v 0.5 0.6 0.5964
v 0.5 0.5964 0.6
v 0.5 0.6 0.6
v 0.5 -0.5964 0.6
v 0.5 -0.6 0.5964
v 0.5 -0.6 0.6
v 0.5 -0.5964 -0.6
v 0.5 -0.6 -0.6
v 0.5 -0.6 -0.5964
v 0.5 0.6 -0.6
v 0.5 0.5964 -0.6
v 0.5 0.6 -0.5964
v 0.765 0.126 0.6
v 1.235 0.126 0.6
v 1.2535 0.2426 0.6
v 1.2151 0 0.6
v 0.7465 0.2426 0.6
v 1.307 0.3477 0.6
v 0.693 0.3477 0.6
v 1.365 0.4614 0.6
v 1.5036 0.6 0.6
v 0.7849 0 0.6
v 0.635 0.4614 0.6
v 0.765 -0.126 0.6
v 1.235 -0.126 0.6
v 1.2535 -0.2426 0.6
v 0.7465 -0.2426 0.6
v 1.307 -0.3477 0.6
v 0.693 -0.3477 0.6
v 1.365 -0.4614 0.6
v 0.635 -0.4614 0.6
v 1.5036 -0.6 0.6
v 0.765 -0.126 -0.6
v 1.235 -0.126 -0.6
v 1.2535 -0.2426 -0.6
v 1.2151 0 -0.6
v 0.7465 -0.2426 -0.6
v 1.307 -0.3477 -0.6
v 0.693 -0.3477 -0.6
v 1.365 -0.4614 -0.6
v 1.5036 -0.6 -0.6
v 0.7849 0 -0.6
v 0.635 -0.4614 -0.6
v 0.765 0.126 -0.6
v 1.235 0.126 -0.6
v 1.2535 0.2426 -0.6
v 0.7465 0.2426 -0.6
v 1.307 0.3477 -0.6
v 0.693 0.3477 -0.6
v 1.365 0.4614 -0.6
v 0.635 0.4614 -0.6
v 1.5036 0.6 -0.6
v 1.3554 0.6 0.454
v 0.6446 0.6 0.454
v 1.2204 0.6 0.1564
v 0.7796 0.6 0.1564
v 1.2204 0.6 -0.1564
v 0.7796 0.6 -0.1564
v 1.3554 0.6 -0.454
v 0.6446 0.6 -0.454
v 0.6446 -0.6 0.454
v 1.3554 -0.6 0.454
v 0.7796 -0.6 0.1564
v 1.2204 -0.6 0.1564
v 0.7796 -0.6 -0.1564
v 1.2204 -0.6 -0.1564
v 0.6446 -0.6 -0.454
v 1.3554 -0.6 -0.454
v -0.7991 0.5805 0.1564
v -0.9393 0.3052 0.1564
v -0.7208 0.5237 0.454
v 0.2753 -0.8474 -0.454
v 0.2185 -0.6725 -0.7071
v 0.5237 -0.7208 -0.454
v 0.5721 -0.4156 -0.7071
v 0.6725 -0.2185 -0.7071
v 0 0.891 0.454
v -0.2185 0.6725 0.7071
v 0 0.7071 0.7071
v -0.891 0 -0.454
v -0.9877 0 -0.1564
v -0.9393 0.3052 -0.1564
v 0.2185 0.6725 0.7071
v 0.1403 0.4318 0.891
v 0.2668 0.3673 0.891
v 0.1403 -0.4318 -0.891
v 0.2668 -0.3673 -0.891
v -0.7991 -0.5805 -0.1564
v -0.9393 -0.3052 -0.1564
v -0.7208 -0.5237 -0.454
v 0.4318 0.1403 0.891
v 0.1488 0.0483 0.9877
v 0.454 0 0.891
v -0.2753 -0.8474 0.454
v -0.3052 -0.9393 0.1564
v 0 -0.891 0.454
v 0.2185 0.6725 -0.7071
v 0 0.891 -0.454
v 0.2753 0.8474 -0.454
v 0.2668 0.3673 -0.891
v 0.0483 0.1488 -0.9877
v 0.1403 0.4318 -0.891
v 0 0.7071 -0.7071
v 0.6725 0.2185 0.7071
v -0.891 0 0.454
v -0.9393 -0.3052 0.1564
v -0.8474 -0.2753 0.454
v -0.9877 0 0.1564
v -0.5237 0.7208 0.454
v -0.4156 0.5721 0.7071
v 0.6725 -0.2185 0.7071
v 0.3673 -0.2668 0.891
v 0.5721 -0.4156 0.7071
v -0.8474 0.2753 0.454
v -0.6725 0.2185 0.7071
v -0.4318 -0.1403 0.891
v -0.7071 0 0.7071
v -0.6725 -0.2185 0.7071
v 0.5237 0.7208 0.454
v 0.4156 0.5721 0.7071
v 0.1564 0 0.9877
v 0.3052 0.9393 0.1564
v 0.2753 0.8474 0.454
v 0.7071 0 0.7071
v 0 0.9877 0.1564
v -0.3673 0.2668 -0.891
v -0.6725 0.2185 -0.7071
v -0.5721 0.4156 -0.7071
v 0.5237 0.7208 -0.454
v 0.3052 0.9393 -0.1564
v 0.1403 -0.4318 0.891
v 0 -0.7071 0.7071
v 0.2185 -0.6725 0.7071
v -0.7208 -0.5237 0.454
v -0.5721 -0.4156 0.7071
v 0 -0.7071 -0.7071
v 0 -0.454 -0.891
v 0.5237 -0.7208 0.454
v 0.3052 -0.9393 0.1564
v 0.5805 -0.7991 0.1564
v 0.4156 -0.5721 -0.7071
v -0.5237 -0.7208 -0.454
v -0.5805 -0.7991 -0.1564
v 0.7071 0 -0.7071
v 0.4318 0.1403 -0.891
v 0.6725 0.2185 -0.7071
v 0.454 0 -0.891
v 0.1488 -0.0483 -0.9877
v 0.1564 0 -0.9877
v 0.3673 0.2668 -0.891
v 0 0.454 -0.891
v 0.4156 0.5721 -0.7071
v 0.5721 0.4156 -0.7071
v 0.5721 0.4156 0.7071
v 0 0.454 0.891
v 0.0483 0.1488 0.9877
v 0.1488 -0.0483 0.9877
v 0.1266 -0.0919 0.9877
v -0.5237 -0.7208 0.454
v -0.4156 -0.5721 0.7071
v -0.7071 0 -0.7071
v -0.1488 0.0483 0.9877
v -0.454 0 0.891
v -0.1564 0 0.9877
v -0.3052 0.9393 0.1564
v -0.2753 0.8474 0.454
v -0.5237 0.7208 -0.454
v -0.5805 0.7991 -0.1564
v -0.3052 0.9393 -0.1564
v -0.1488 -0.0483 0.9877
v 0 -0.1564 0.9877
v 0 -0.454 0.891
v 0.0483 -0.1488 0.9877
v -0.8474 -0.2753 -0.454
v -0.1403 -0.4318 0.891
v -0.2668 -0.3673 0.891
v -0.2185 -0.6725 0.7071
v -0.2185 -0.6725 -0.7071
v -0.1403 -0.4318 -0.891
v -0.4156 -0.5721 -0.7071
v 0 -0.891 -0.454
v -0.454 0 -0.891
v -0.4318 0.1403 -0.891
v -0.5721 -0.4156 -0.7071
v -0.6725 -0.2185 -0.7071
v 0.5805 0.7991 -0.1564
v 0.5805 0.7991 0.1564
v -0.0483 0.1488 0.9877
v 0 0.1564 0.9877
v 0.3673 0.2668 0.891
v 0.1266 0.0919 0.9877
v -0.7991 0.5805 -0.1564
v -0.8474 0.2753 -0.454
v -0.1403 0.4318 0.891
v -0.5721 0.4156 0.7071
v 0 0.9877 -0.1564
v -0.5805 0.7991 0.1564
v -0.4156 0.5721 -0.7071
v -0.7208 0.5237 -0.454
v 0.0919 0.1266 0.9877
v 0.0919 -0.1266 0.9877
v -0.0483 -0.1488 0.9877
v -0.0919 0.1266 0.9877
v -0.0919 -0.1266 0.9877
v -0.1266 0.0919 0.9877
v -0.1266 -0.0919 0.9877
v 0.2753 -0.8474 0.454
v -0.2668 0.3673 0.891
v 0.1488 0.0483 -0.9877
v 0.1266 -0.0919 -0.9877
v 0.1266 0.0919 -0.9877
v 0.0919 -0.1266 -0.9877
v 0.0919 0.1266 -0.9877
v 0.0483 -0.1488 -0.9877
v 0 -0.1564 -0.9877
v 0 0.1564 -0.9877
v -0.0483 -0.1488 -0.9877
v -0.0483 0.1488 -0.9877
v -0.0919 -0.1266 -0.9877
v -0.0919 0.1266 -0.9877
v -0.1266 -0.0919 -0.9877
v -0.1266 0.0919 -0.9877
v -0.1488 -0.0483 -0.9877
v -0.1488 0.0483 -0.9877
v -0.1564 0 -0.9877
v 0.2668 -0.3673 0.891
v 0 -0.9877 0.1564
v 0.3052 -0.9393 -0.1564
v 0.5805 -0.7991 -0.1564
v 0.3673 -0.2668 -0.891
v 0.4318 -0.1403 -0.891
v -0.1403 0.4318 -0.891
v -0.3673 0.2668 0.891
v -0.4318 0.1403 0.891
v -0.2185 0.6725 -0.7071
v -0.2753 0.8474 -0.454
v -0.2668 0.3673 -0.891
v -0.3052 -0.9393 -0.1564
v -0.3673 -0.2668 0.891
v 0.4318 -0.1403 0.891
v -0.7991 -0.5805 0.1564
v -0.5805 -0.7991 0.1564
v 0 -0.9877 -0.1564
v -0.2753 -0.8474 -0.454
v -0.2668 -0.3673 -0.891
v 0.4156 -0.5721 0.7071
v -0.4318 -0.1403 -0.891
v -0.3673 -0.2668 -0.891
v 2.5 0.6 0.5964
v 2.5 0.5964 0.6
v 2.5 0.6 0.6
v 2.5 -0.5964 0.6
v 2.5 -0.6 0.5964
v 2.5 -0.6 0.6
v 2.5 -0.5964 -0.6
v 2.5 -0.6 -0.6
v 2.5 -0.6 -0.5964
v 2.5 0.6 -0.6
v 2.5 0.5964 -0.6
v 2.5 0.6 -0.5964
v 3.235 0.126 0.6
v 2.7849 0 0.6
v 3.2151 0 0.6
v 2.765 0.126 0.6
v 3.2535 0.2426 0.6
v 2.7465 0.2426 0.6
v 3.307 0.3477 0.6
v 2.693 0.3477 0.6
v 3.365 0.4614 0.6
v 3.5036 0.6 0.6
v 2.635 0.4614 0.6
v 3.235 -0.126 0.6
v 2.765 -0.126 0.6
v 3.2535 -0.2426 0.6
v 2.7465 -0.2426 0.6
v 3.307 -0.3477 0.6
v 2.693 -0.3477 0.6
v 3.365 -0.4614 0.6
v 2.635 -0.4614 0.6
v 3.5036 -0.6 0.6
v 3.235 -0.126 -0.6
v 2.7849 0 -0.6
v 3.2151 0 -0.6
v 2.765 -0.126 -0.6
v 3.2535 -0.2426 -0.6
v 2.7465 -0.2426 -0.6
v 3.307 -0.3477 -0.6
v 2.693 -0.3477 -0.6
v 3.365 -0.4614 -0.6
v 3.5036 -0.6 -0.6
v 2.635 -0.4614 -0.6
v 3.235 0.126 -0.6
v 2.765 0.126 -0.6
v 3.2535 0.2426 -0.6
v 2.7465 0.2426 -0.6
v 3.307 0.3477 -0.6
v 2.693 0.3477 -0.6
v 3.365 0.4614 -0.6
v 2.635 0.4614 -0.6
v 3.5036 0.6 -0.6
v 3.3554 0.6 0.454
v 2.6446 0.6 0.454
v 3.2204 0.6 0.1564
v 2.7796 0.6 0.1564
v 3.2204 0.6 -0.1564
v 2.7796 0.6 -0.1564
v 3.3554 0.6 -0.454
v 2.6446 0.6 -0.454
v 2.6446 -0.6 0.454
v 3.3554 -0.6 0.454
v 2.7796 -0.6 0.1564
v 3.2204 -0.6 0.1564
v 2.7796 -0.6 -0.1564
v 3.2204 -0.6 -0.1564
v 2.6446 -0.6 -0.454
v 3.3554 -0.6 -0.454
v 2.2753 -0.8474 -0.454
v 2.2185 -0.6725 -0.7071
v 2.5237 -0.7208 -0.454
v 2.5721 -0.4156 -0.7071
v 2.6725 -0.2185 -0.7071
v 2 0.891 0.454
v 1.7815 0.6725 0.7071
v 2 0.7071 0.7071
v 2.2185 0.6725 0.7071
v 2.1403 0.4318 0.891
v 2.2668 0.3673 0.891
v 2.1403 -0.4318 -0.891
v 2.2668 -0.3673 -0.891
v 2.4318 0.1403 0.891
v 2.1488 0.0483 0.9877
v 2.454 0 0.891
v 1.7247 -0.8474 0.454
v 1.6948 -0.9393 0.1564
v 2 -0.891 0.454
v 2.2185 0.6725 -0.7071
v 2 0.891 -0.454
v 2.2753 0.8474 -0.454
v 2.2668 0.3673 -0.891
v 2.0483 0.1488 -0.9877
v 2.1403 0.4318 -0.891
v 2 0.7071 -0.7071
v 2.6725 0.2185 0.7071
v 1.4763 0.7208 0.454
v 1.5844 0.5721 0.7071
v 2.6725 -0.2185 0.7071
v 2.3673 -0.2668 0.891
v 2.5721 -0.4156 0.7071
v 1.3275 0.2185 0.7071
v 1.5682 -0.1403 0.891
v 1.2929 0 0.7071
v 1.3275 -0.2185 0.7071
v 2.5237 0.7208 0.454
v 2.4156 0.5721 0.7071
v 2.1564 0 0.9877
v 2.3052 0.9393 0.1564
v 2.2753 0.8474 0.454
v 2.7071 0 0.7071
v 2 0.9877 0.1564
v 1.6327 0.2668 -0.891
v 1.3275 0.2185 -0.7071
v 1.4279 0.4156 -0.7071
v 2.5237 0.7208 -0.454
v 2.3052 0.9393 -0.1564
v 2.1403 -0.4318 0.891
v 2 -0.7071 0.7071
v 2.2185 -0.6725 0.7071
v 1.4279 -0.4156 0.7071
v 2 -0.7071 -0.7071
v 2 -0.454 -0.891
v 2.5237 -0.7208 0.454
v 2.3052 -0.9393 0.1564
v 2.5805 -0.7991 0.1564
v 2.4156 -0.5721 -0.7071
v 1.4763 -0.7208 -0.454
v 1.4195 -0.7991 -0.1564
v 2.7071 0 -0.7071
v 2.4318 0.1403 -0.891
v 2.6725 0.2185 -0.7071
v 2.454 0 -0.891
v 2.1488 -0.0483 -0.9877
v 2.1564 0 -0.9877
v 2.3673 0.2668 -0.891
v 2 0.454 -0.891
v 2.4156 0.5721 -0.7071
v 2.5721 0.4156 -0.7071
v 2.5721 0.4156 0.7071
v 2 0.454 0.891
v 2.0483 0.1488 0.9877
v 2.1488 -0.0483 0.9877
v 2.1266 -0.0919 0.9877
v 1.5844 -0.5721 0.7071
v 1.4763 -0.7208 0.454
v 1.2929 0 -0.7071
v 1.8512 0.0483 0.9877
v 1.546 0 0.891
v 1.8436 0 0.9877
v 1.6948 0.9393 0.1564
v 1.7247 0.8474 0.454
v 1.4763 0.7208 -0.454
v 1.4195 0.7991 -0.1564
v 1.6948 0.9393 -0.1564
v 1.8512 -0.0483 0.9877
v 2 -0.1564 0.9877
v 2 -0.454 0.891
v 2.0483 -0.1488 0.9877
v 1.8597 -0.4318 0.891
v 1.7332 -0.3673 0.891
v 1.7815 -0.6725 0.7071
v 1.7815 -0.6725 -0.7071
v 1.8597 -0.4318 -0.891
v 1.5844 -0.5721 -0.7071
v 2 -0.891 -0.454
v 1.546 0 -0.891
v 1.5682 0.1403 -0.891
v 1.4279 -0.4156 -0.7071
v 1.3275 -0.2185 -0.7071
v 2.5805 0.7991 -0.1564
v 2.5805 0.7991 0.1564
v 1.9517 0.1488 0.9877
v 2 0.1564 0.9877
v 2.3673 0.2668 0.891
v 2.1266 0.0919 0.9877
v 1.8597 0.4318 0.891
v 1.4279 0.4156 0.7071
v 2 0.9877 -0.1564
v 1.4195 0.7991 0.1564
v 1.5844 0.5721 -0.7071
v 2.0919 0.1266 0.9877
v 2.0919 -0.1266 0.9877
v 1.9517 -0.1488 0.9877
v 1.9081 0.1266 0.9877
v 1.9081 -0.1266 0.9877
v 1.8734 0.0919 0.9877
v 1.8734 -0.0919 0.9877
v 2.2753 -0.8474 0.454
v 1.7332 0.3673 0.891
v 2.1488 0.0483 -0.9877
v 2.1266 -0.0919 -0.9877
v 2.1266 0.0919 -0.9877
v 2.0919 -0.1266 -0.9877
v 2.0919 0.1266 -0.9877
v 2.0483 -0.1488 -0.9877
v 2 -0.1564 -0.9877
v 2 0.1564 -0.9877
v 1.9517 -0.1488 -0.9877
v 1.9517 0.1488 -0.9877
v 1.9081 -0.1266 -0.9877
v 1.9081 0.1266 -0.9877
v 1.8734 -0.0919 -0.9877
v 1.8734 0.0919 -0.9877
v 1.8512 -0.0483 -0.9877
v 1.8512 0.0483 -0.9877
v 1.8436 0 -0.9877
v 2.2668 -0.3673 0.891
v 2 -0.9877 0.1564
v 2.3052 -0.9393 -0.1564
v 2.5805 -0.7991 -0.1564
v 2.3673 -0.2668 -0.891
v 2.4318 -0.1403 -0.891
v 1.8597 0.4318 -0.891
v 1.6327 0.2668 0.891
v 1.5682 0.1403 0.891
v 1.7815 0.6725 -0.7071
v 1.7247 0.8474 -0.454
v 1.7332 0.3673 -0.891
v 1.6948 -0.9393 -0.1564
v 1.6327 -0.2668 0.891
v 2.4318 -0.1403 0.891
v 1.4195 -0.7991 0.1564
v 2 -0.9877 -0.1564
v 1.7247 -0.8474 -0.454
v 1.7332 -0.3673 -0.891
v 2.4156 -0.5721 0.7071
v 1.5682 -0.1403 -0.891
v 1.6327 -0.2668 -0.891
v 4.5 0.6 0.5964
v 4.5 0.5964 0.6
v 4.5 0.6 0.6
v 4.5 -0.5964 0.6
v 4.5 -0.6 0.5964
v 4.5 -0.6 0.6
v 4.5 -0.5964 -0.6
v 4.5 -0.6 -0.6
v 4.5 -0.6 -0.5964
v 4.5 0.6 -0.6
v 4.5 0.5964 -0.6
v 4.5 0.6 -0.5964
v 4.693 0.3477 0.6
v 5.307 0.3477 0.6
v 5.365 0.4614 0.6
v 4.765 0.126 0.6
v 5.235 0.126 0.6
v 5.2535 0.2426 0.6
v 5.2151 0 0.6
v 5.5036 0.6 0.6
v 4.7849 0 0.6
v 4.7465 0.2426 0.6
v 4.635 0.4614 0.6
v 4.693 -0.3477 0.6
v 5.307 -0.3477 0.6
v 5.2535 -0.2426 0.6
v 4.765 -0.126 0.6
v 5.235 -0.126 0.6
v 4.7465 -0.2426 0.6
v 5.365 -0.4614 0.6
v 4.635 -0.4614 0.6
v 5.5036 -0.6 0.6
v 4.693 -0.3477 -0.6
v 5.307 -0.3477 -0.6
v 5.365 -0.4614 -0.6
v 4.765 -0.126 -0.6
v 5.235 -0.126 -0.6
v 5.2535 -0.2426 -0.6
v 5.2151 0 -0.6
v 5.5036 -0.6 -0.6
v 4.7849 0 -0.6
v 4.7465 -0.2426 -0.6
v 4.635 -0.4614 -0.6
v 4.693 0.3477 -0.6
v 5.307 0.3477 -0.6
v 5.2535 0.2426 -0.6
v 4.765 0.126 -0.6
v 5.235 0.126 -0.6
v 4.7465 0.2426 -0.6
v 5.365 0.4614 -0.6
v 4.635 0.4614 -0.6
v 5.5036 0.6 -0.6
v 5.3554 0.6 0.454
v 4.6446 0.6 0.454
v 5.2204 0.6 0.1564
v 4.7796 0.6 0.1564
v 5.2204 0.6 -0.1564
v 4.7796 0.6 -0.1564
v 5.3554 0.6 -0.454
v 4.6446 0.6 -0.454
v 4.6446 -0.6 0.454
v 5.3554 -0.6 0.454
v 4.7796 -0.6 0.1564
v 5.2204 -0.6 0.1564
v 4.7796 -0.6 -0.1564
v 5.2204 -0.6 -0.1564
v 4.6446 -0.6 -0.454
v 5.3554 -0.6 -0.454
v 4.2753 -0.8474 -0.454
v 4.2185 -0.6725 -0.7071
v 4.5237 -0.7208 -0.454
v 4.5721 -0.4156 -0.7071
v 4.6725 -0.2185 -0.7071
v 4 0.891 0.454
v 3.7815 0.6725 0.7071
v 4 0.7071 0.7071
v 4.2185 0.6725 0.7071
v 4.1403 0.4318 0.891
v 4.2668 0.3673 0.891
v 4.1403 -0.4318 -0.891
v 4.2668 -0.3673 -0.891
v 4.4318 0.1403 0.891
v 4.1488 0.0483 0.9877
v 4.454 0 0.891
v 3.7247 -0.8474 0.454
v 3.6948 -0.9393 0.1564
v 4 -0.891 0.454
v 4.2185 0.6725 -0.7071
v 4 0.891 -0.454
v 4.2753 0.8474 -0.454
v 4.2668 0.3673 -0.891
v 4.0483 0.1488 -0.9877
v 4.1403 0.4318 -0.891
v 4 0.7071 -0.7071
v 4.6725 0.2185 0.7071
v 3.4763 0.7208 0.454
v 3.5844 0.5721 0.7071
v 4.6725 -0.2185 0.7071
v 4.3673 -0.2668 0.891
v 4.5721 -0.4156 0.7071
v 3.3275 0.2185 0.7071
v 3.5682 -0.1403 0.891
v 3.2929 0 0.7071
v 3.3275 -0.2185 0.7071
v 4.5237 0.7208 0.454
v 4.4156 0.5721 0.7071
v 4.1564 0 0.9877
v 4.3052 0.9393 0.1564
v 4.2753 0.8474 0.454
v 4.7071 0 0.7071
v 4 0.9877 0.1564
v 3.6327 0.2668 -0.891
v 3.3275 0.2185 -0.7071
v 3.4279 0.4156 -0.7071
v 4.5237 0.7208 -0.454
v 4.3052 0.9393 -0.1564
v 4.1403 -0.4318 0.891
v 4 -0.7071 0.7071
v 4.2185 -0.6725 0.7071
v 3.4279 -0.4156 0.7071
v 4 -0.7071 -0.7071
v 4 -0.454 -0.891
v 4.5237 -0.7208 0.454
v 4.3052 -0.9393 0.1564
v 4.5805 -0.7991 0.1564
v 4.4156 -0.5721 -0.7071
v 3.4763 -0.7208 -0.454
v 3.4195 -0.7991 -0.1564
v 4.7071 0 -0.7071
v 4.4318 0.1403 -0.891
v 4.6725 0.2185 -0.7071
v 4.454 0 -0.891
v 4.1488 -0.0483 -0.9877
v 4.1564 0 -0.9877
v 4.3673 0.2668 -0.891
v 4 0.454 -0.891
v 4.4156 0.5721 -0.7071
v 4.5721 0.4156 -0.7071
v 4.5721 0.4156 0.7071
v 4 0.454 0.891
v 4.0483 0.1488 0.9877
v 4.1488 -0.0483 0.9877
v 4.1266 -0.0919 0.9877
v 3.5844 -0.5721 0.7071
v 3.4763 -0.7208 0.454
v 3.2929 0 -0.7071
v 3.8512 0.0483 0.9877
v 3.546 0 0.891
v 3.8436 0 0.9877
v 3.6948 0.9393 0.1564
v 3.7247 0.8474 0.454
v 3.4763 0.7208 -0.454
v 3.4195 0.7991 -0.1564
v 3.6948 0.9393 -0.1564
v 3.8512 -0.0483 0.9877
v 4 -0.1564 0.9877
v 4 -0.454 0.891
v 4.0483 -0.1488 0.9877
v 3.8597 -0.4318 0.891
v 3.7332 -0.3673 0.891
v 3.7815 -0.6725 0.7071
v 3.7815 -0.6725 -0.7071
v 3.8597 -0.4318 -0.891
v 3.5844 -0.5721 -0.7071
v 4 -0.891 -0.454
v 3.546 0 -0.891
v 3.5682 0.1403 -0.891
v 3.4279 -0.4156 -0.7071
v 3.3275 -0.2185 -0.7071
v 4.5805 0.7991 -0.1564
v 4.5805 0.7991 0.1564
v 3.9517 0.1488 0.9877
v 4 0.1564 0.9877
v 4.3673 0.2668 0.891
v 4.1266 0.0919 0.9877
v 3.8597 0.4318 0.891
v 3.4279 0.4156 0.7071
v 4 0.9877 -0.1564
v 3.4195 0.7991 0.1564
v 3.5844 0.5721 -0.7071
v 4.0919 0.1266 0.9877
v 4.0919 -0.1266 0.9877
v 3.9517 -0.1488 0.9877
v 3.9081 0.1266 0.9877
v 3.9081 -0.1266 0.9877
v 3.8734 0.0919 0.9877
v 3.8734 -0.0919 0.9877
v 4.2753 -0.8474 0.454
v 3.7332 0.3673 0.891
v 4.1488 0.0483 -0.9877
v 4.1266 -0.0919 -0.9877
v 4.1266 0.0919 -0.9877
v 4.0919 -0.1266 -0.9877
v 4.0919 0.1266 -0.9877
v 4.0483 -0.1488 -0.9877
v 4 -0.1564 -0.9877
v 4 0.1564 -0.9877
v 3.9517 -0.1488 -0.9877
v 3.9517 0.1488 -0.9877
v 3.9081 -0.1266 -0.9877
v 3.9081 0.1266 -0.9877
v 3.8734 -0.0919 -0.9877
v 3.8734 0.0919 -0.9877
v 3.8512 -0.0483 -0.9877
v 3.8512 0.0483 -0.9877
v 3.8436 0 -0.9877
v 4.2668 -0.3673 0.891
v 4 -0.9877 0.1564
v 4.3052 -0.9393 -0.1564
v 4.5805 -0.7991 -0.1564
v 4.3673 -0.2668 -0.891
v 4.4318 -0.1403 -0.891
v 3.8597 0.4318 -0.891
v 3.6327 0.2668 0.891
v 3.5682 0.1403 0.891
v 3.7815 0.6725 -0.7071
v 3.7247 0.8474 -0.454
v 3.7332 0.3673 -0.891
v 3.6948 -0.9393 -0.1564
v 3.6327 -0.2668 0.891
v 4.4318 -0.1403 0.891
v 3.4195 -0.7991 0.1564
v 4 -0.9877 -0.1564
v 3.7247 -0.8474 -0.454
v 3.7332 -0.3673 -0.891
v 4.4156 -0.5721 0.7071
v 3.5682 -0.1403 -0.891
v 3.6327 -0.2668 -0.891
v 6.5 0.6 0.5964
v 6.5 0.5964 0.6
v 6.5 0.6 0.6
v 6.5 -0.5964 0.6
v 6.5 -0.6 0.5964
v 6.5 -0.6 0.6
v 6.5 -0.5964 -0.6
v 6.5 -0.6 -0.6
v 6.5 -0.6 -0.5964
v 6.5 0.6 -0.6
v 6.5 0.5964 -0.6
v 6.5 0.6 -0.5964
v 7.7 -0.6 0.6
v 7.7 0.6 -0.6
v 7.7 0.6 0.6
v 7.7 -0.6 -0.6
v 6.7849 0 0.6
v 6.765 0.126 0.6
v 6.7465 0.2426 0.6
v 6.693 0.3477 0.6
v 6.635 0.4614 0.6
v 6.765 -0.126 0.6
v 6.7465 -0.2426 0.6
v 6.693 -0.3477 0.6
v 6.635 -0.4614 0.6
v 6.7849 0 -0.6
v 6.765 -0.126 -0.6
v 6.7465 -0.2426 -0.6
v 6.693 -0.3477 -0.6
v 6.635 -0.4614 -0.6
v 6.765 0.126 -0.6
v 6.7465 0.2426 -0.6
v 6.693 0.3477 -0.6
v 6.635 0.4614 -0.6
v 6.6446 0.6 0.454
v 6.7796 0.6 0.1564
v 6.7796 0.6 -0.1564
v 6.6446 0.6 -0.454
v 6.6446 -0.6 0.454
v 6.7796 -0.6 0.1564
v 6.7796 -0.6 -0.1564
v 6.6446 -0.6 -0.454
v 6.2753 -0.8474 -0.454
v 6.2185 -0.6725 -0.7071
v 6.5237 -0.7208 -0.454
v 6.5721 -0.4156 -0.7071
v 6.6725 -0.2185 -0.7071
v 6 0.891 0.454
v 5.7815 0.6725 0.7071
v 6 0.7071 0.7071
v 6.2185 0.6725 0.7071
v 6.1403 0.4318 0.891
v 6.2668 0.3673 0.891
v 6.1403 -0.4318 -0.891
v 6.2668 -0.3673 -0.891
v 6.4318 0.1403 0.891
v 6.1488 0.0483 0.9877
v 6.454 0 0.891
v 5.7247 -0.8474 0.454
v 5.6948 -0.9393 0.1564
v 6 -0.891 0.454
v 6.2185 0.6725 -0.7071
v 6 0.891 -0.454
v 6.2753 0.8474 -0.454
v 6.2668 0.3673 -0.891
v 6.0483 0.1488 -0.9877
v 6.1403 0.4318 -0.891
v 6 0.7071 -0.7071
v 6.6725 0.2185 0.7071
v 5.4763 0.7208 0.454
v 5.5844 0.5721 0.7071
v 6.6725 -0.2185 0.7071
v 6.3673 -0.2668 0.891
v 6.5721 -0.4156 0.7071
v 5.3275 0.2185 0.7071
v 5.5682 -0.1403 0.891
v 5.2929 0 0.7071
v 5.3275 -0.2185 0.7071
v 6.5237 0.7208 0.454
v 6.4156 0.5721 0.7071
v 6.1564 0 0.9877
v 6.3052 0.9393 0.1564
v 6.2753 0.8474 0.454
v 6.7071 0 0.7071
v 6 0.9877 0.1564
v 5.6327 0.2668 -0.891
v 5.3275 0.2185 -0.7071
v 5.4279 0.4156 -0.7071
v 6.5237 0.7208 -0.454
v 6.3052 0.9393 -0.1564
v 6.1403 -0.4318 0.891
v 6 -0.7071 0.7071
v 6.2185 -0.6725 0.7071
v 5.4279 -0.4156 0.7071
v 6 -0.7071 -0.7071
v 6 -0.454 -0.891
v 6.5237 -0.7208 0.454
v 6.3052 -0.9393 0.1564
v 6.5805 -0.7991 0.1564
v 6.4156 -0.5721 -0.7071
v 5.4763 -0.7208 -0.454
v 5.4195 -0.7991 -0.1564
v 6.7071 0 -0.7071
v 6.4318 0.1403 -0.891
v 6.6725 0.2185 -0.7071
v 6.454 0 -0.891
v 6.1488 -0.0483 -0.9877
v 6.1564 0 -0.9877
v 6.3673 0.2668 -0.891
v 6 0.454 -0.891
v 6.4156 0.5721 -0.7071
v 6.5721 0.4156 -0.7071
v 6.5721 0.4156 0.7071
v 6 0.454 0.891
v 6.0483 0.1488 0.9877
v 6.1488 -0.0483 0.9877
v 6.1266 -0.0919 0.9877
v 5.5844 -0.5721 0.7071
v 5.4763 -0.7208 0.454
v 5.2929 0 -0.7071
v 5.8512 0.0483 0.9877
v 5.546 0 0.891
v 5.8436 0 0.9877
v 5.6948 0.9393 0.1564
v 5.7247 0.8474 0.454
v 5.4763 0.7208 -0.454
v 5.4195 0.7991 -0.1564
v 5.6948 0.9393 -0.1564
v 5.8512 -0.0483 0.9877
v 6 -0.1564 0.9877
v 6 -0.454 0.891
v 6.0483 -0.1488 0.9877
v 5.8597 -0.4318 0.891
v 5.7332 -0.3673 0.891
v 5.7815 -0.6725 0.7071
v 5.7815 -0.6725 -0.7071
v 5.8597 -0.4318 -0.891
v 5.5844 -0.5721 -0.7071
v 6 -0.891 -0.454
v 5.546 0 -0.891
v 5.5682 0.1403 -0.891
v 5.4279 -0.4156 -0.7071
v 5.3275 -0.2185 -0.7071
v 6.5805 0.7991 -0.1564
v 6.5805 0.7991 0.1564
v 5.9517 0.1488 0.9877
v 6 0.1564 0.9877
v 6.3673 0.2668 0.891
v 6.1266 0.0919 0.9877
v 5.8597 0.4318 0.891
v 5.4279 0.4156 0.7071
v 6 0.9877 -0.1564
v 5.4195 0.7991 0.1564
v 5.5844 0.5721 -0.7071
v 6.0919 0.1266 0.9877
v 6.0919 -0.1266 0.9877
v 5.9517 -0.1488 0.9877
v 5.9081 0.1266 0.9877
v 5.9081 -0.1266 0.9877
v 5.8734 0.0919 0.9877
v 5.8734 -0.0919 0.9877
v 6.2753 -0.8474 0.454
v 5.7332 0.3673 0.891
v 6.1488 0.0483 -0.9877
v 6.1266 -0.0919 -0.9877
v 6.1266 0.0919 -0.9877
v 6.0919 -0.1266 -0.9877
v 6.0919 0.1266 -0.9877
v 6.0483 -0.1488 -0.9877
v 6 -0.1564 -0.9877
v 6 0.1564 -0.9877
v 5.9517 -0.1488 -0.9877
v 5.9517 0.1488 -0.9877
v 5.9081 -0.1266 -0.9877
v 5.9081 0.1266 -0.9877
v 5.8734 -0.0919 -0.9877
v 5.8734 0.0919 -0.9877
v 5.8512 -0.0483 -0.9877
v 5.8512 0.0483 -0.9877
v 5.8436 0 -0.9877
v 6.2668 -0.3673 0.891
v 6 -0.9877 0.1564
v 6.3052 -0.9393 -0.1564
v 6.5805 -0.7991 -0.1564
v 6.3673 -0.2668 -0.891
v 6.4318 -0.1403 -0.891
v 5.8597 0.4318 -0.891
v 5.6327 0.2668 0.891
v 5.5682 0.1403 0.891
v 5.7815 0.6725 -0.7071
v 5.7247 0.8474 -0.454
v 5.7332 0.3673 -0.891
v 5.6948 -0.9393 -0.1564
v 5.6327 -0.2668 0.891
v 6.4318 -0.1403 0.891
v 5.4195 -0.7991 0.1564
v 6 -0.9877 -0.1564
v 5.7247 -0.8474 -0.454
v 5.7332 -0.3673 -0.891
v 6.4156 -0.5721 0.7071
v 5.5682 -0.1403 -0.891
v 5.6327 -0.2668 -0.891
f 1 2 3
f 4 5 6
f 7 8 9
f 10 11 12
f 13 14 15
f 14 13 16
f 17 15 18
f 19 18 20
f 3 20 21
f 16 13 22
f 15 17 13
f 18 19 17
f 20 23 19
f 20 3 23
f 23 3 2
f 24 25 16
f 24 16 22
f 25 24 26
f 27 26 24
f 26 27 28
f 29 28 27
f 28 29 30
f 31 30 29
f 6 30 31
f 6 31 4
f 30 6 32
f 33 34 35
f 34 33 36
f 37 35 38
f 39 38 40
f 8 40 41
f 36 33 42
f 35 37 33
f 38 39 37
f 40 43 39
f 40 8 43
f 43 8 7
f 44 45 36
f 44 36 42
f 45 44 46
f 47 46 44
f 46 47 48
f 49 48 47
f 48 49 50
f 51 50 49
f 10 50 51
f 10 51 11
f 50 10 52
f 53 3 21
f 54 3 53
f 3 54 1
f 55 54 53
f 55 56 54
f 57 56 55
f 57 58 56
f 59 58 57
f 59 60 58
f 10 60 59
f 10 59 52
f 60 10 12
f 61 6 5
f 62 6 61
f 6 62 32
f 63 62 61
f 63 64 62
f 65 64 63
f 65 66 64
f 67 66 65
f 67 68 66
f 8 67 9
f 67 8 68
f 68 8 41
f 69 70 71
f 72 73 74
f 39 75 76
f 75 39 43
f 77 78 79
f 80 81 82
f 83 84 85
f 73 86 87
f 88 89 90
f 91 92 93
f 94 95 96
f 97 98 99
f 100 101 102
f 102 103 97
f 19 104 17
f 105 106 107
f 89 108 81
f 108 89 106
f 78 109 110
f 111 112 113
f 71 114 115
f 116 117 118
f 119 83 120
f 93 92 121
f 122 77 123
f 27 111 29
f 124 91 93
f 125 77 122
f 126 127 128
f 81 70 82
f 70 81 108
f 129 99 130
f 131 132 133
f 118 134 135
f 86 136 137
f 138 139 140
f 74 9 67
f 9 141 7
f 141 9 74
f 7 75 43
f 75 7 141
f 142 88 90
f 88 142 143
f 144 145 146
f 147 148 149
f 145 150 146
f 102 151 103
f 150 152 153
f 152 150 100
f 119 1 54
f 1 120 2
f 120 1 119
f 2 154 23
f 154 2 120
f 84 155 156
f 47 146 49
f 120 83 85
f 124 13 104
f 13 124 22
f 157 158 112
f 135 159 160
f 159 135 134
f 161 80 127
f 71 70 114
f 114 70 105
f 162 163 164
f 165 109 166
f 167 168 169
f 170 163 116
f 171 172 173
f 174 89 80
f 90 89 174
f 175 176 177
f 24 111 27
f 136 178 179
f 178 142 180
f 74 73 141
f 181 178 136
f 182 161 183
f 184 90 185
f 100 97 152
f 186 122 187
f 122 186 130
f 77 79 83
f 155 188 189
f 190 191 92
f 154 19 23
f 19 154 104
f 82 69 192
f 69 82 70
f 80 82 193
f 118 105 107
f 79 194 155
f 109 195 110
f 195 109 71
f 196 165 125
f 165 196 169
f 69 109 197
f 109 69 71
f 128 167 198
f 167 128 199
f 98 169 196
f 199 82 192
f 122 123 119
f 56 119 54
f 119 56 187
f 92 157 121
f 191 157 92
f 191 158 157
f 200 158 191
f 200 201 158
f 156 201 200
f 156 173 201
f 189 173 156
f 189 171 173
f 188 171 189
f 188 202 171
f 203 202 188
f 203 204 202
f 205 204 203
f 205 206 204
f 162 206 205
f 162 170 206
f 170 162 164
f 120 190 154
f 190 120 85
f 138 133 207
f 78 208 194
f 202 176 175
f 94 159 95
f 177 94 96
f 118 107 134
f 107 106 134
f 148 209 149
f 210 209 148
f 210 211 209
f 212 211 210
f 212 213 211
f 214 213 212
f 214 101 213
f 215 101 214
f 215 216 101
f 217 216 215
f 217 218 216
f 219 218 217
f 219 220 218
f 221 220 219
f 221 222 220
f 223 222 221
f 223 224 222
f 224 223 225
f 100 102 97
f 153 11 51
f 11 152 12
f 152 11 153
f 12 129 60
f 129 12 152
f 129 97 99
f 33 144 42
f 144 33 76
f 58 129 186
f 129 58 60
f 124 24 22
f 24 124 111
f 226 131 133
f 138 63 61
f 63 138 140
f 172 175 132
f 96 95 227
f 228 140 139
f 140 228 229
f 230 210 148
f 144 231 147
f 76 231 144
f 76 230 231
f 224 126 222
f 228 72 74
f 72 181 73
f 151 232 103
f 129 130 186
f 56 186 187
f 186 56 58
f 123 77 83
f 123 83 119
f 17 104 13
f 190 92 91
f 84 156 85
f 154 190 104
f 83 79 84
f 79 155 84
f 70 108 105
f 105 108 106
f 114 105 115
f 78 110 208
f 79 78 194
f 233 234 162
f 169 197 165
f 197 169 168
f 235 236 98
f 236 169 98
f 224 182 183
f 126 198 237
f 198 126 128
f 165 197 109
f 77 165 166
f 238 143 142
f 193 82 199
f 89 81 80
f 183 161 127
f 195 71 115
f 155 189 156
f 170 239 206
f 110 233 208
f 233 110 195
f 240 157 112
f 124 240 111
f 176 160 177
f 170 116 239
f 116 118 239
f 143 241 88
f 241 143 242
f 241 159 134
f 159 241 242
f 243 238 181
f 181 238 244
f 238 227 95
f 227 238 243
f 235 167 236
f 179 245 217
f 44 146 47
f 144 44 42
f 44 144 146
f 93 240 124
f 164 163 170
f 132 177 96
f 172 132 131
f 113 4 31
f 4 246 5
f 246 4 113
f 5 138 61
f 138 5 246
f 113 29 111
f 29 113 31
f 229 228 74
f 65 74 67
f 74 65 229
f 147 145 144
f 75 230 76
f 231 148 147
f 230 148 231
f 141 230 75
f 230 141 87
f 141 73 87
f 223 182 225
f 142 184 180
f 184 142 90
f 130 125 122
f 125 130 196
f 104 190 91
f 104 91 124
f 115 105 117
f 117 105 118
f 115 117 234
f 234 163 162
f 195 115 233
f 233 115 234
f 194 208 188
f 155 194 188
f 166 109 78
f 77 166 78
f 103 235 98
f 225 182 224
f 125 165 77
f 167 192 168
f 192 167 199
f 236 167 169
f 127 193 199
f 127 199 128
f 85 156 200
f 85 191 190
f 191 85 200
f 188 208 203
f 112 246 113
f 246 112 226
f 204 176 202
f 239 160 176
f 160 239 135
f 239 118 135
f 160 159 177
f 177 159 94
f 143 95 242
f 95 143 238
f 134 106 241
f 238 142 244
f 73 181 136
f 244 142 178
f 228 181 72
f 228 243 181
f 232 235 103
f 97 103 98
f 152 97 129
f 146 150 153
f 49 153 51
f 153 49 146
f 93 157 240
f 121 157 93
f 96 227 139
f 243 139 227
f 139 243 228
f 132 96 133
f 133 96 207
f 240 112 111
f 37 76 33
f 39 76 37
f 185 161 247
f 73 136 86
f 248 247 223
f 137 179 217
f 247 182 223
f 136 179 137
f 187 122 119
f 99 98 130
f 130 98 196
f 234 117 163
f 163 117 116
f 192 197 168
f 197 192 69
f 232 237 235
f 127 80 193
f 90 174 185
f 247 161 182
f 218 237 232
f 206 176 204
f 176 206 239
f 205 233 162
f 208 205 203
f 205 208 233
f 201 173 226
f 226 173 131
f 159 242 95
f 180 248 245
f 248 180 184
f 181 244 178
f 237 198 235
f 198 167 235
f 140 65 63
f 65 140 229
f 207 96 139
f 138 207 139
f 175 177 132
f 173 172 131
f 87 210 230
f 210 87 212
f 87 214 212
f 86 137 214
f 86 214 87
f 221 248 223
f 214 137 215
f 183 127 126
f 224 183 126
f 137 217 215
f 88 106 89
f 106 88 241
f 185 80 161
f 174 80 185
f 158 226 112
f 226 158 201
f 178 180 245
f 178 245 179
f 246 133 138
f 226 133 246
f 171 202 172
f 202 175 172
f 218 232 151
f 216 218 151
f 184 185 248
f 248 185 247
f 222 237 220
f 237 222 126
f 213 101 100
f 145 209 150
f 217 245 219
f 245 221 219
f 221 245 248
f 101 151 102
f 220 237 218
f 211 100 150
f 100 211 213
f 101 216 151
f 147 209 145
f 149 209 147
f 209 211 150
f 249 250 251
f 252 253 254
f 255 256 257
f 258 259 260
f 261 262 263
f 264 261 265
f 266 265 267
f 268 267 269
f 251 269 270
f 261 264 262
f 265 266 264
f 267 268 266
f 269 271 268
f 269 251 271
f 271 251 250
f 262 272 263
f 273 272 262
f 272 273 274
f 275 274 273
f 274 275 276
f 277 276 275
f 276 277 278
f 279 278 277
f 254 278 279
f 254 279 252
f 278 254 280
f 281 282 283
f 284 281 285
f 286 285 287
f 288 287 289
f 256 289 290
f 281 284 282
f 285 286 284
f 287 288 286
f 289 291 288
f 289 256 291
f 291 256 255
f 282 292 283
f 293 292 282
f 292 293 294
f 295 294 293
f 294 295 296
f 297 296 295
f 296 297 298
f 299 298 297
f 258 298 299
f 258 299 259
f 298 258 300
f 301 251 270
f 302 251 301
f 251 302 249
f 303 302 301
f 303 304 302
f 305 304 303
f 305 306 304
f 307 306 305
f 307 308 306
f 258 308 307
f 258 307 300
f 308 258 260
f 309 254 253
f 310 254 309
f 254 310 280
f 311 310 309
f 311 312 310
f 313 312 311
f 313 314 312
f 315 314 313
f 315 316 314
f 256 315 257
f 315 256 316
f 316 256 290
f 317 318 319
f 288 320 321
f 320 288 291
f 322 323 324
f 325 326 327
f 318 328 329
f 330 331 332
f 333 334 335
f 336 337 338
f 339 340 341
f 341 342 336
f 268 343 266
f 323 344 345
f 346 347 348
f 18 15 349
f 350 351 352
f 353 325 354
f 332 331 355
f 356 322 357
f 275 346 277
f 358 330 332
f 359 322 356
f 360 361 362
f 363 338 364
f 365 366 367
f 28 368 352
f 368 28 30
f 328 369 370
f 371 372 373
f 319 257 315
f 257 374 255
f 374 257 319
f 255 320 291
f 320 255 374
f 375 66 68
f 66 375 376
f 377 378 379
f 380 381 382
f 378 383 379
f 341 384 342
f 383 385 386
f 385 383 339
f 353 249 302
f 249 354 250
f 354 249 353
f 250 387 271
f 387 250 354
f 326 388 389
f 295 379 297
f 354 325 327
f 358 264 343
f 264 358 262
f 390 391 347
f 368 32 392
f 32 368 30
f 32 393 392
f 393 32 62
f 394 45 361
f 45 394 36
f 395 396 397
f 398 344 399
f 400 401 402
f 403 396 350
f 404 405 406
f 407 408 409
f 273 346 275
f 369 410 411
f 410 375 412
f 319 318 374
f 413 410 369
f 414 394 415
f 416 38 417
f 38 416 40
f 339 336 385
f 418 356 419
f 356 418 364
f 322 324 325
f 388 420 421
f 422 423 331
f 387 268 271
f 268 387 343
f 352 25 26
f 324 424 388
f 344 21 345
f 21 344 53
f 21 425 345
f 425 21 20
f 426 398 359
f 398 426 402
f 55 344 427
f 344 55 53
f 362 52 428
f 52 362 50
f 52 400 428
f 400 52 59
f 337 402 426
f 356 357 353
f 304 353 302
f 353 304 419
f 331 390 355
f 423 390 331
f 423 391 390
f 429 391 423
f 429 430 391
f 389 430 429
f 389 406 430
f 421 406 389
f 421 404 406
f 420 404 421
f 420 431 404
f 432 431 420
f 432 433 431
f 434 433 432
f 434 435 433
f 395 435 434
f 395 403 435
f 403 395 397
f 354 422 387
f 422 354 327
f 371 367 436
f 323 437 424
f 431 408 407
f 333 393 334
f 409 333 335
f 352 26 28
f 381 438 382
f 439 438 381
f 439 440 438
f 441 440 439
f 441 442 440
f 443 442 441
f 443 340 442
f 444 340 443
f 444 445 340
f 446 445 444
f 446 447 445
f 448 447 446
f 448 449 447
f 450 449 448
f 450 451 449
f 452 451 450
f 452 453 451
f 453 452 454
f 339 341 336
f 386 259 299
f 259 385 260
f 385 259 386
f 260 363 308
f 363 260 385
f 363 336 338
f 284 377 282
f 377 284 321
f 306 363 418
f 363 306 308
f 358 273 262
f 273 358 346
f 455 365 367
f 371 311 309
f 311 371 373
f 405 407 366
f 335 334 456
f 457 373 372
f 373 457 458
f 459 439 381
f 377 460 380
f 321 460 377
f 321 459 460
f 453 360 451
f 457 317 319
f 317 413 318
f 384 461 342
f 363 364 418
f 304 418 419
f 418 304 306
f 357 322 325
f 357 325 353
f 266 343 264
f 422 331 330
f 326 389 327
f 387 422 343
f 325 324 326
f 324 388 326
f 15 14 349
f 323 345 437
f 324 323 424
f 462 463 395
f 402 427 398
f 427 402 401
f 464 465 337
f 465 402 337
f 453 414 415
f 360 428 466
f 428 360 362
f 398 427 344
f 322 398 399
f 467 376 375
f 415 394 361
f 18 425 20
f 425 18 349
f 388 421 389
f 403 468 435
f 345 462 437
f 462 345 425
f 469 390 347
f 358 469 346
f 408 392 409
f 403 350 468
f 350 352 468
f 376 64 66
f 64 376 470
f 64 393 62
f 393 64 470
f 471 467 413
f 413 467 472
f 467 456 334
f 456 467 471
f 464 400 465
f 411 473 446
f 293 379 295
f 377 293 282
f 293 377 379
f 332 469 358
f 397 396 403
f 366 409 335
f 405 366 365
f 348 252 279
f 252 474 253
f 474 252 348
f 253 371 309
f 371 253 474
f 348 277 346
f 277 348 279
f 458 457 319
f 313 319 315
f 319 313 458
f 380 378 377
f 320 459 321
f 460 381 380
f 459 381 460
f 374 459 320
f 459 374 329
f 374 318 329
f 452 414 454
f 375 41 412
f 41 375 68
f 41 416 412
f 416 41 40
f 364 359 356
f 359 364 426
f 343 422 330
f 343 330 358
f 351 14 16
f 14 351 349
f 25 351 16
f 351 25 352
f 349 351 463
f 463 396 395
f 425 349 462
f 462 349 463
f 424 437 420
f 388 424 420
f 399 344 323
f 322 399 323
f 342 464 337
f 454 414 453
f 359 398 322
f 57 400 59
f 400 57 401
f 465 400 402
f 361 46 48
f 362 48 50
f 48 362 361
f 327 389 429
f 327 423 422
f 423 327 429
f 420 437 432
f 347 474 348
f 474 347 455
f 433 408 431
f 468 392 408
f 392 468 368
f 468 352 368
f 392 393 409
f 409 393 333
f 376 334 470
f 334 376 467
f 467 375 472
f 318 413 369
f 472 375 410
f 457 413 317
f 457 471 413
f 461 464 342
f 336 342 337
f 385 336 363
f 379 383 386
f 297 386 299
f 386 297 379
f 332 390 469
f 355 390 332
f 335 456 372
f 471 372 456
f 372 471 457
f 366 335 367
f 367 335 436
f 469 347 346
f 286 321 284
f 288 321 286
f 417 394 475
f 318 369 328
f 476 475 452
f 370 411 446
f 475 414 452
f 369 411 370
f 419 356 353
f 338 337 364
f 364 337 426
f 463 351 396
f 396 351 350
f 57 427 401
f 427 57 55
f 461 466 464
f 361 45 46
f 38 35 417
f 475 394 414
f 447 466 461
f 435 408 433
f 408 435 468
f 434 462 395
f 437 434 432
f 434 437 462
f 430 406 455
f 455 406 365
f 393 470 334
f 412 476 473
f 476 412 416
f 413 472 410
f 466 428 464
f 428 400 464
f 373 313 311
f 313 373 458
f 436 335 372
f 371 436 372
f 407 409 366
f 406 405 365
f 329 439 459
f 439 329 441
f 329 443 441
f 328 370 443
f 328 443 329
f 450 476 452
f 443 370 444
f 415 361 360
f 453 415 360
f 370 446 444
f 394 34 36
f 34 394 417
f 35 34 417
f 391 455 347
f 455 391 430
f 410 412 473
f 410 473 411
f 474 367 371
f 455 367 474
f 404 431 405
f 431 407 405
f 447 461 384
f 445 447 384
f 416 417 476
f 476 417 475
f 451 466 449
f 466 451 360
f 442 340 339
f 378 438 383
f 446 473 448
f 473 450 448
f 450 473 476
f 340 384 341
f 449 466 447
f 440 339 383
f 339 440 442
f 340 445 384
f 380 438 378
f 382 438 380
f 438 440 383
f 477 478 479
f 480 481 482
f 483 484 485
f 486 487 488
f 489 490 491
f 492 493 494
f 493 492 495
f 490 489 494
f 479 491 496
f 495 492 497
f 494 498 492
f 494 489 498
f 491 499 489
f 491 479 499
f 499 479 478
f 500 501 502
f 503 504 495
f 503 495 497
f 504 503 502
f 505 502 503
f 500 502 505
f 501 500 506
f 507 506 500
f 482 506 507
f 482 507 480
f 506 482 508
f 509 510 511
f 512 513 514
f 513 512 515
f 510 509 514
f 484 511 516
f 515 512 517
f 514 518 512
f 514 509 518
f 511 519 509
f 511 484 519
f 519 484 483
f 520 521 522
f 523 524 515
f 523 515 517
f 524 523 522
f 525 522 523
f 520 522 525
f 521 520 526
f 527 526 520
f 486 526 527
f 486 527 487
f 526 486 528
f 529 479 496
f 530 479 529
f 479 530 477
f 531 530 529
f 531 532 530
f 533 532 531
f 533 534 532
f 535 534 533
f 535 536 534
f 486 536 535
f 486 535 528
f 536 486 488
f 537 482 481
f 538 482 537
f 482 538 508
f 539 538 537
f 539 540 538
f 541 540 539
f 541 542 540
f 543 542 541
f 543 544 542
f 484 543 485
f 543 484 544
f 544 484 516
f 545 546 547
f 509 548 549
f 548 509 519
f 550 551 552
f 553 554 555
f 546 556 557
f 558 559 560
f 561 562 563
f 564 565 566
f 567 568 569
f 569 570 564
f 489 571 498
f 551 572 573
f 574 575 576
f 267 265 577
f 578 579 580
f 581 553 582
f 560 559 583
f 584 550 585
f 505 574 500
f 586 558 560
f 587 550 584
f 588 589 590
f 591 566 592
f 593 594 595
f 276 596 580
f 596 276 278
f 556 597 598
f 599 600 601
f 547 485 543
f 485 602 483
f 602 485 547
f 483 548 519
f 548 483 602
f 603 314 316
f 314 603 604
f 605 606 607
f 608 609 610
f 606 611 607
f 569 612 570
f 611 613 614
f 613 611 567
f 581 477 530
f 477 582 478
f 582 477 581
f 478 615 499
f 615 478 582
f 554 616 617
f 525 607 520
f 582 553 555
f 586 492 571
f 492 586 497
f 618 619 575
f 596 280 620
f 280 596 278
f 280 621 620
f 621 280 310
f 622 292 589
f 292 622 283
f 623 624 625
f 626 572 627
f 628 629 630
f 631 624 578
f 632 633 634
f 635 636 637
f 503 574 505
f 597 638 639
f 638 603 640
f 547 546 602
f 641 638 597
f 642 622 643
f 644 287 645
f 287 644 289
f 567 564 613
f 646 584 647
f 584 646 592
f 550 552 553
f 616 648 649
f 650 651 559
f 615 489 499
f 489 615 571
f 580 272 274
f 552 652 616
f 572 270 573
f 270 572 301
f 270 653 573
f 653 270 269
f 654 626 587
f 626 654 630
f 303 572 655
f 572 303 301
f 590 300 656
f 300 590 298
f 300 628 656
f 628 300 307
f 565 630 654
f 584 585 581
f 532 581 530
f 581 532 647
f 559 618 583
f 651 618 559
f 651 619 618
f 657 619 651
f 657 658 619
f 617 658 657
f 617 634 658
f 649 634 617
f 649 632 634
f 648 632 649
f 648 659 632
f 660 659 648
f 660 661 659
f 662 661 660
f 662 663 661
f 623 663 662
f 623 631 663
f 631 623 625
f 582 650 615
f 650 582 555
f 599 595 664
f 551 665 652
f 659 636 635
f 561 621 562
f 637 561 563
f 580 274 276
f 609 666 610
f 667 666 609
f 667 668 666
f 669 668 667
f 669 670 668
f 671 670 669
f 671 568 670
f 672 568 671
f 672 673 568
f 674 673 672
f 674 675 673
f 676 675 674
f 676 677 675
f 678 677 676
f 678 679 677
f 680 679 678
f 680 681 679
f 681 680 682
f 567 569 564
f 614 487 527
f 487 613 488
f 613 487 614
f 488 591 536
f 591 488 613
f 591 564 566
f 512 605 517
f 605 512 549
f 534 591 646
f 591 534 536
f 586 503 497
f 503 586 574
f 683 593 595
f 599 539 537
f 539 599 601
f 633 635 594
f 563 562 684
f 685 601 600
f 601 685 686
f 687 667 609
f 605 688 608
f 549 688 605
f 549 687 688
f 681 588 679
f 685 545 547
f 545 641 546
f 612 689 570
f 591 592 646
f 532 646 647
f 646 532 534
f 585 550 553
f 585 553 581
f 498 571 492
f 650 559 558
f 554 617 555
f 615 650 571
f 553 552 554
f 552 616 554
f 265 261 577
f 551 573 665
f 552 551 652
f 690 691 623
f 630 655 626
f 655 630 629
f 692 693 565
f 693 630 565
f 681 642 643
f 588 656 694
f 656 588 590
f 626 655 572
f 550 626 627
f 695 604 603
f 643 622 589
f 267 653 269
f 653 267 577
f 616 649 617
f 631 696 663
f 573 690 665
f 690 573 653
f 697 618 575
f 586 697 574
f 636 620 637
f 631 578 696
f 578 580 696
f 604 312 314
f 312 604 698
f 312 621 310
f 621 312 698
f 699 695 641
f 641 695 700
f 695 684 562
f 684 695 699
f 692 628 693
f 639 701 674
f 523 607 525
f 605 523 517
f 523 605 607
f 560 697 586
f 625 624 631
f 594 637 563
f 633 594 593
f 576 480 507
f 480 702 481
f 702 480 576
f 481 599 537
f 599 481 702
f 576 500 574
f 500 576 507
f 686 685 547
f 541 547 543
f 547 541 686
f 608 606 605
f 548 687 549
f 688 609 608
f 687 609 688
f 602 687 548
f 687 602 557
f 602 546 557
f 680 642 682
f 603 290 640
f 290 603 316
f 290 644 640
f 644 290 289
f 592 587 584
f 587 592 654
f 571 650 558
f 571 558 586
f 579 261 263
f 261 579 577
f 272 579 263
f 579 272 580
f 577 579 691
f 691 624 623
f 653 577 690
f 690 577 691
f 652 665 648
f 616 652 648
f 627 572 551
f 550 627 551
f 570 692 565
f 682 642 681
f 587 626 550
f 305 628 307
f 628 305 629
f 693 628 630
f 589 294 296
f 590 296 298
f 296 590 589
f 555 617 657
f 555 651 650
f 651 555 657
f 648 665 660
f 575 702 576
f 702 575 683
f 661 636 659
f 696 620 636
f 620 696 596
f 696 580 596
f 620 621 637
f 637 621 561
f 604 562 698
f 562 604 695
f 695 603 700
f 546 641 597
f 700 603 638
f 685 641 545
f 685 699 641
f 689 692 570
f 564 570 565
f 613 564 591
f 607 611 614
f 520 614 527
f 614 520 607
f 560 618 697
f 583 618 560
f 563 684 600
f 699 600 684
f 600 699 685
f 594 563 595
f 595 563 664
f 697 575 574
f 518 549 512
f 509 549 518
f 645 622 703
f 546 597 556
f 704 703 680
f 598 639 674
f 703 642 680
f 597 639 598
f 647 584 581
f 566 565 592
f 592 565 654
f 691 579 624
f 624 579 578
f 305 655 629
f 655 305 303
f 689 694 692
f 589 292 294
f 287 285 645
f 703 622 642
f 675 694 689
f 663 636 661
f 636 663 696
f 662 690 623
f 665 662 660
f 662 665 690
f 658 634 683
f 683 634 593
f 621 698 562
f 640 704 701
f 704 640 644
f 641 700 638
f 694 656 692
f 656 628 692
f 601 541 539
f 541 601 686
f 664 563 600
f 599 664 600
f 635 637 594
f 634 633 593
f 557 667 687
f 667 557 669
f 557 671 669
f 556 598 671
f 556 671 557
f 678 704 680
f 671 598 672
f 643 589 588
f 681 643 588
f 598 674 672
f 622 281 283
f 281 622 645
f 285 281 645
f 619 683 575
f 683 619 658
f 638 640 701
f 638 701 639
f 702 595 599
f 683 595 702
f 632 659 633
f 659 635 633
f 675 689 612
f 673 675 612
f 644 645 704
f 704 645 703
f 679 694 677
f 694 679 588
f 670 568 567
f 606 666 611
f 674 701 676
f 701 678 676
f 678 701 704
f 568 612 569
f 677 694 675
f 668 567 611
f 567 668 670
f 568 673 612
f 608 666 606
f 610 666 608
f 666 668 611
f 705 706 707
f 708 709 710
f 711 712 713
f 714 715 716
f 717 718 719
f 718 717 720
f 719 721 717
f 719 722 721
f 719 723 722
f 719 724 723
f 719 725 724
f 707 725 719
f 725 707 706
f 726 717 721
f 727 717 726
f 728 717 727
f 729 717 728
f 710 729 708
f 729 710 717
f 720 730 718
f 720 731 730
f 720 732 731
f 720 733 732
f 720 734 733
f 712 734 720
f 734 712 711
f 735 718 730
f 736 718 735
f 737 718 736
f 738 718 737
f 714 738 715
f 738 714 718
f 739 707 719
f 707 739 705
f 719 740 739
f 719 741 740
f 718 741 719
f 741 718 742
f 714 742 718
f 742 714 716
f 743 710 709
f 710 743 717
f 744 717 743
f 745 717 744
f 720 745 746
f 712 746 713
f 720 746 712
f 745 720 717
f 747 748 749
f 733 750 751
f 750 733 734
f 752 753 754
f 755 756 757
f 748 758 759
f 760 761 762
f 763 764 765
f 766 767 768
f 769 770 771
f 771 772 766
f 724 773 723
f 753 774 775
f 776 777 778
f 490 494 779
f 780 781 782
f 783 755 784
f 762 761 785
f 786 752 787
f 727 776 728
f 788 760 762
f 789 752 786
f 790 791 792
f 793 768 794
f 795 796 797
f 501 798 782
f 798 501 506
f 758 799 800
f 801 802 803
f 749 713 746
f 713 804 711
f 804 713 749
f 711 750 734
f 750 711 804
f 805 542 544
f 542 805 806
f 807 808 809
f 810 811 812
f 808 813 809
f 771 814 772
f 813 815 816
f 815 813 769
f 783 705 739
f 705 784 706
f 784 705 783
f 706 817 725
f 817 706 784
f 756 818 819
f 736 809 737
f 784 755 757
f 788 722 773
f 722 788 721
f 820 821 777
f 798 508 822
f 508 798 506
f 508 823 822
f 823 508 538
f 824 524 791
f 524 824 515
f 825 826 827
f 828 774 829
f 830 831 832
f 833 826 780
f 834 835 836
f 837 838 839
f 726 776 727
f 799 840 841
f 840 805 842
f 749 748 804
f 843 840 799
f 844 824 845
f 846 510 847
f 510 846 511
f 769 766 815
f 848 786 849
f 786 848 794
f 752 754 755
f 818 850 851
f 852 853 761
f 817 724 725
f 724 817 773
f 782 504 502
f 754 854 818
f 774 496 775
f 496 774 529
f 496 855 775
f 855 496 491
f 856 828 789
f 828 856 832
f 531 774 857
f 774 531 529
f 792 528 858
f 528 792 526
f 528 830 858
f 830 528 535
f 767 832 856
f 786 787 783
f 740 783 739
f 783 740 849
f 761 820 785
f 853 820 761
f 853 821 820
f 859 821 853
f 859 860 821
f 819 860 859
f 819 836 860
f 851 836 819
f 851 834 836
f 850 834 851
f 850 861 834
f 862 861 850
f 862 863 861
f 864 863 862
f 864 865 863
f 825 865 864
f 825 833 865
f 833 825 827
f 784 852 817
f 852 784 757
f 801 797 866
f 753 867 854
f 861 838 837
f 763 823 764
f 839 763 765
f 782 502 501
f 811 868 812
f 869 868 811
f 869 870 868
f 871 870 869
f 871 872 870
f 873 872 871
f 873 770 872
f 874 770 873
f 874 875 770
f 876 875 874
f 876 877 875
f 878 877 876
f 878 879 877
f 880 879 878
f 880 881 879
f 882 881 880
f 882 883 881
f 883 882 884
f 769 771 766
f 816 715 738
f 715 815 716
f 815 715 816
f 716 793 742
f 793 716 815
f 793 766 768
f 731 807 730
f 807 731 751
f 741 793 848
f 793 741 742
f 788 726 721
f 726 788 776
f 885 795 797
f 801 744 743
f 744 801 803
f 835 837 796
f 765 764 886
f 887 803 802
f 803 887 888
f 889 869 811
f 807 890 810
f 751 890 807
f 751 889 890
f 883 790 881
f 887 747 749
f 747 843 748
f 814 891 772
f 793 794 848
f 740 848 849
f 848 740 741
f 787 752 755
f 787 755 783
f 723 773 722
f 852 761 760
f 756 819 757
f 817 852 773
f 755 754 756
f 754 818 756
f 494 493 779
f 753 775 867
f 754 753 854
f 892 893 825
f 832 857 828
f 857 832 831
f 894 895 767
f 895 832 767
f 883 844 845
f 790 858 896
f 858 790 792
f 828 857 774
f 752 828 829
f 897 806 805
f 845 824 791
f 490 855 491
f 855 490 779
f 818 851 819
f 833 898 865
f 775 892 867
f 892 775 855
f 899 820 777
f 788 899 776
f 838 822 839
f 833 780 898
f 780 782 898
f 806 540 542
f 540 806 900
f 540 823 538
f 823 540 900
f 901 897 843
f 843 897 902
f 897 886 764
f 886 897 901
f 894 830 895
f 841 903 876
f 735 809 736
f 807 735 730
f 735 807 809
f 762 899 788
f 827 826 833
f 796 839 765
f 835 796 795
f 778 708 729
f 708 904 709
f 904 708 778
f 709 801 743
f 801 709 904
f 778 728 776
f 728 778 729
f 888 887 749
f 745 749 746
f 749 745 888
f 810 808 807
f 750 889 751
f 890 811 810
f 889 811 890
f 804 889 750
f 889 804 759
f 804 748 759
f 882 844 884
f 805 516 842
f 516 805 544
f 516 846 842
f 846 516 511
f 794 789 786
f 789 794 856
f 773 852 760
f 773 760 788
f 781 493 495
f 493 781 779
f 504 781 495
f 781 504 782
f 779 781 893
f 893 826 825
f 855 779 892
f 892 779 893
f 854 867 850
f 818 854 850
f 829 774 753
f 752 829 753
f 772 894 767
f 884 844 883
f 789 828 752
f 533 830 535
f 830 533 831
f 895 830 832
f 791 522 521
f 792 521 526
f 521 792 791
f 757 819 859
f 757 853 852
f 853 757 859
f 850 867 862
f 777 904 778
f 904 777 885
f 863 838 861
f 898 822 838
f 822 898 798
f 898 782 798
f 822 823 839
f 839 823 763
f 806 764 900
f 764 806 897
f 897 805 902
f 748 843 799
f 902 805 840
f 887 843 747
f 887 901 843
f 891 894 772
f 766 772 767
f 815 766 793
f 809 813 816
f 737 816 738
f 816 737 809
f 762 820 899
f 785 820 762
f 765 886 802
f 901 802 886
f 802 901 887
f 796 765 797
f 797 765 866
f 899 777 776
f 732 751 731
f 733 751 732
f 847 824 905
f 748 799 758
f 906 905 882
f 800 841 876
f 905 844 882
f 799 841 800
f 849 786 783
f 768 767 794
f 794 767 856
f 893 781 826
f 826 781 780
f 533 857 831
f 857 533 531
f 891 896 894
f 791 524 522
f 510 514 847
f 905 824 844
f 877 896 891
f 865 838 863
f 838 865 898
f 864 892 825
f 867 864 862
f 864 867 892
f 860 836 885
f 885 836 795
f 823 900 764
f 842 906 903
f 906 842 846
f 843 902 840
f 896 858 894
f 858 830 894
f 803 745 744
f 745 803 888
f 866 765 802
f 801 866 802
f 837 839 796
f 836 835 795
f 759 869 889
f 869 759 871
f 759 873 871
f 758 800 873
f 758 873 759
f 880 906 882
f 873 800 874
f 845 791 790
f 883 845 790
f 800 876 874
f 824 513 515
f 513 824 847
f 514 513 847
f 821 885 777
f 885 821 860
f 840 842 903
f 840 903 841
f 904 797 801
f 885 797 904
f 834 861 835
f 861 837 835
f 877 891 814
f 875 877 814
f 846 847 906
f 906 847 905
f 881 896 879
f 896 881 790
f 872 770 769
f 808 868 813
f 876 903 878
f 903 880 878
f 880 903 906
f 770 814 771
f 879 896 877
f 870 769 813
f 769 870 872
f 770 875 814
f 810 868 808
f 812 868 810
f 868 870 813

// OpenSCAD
//*
$fn=20;

// translate([1, 0, 0]) {
//   cube(1, center=true);
//   translate([0.1, 0, 0])
//     cube(1.2, center=true);
// }

module A() {
  sphere(1);
  translate([1, 0, 0]) {
    cube(1, center=true);
    translate([0.1, 0, 0])
      cube(1.2, center=true);
  }
}

for (i=[0:3])
    translate([i*2, 0, 0]) A();


//*/
// translate([1, 0, 0]) { cube(); sphere(); }
// translate([1, 0, 0]) { cube(); sphere(); }
